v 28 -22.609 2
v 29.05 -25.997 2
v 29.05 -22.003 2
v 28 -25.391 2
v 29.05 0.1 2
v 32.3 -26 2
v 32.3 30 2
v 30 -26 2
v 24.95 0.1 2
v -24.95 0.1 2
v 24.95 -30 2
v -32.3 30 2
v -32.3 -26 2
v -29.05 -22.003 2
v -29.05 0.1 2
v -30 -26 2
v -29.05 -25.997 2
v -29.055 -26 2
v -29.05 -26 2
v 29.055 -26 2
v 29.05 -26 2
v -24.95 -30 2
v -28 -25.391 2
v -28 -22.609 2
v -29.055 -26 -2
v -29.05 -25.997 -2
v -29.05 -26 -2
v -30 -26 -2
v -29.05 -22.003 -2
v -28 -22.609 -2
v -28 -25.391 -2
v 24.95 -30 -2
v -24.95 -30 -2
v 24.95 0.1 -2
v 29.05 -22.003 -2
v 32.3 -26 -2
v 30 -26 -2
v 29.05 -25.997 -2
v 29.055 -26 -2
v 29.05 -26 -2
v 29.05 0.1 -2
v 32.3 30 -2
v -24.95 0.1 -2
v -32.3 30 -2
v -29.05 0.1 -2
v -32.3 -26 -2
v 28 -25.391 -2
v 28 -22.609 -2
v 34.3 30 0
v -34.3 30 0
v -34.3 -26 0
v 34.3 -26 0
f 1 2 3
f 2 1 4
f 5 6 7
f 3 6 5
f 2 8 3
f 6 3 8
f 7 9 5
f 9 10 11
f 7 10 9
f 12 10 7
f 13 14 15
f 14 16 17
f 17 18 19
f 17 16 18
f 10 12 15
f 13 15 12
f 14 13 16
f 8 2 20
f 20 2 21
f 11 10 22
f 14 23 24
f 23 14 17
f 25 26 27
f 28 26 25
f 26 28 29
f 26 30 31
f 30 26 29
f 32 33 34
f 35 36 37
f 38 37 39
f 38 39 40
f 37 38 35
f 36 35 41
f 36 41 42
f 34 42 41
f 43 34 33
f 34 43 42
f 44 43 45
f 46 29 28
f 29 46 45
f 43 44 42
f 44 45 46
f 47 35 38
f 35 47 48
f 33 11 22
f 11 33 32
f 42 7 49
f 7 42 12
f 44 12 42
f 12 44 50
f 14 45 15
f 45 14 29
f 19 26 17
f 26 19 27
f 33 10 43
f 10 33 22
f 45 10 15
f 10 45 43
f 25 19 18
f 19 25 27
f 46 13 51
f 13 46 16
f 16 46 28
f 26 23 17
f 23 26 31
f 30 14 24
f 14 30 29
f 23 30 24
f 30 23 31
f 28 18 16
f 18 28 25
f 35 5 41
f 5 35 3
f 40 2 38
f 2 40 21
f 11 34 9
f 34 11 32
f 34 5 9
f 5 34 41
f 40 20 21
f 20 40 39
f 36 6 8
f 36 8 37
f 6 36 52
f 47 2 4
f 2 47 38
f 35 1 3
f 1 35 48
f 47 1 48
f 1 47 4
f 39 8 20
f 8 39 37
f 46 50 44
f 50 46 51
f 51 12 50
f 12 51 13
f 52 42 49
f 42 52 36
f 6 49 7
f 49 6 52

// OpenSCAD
/* [Component] */
// Whether to create square of hex shelves
shape = "square"; // [square, hex]
// Whether to create a wall or joint
component = "wall"; // [wall, joint]

/* [Dimensions] */
// The width of a shelf unit base measured between the centers of two adjacent joints
width = 70; // [30:1:200]
// The depth of the shelf
depth = 60; // [30:1:200]
// Whether to engrave a benchy footprint into the wall
benchy_footprint = false;

/* [Wall Mount] */
// Whether to add a wall mount plate to the joint
wall_mount_plate = false;
// The thickness of the wall mount plate
mount_plate_thickness = 3; // [2:0.1:6]
// The angle of the countersink in the mount plate (typically 90 or 82°, 180° for no countersink)
countersink_angle = 90; // [80:1:180]
// The diameter of the screw hole (should be slightly larger than the outer thread diameter of the screw)
screw_hole_diameter = 4; // [2:0.1:6]
// The diameter of the screw head
screw_head_diameter = 8; // [4:0.1:12]

/* [Hidden] */
delta = 0.0001;
tolerance = 0.1;

if (component == "wall") {
  rotate(180) wall(width=width, depth=depth, benchy_footprint=benchy_footprint, hex=shape!="square");
} else if (component == "joint") {
  rotate(180) joint(depth=depth, hex=shape != "square");
}

module wall(width, depth, benchy_footprint=false, hex=false) {
  corner_gap = 0.7;
  hex_offset = hex ? 2*tan(30) : 0;
  intersection() {
    difference() {
      mirror_copy([1, 0, 0]) {
        translate([width/4 - delta, 0, 0]) {
          difference() {
            cube(size=[width/2 + delta, depth, 4], center=true);
            translate([width/4 - 8 + hex_offset, depth/2 - tolerance, 0])
              cube(size=[4 + tolerance, depth, 10], center=true);
            translate([width/4 - 4 + hex_offset, depth/2, 0])
              cube(size=[10, 8 + delta, 10], center=true);
          }
          translate([width/4 - 6 + hex_offset, depth/2 - 6, 0]) {
            difference() {
              cube(size=[2, 4, 4], center=true);
              mirror_copy([0, 1, 0])
                translate([-2, 3.7, 0])
                  rotate(30)
                    cube(size=[5, 5, 5], center=true);
            }
          }
        }
      }
      if (benchy_footprint) {
        translate([-2, 5, 0.4])
          rotate(135)
            scale([1.08, 1.15, 1])
              benchy_footprint();
      }
    }
    scale([1, 1, hex ? tan(60): 1])
      rotate([0, 45, 0])
        cube([(width - 2*corner_gap)/sqrt(2), 2*depth, (width - 2*corner_gap)/sqrt(2)], center=true);
  }
}

module joint(depth, hex=false) {
  cylinder_rotation = hex ? 0 : 22.5;
  outer_radius = hex ? (8 + 2*tan(30))/cos(180/6) : 10/cos(180/8);
  inner_radius = hex ? (4 + 2*tan(30))/cos(180/6) : 6/cos(180/8);
  notch_radius = hex ? (5 + 2*tan(30))/cos(180/6) : 7/cos(180/8);
  edges = hex ? 6 : 8;
  theta_steps = hex ? [0, 120, 240] : [0, 90, 180, 270];

  difference() {
    rotate([0, 0, cylinder_rotation])
      cylinder(h=depth, r=outer_radius, $fn=edges, center=true);
    rotate([0, 0, cylinder_rotation]) {
      translate([0, 0, 4 - tolerance])
        cylinder(h=depth, r=inner_radius, $fn=edges, center=true);
      translate([0, 0, -depth/2 + 6 - 1/2*sin(60) - 2*tolerance])
        cylinder(h=4 - 1/sin(60) + tolerance, r=notch_radius, $fn=edges, center=true);
      translate([0, 0, -depth/2 + 7.4])
        cylinder(h=1/sin(60), r1=notch_radius, r2=inner_radius, $fn=edges, center=true);
    }
    copies(theta=theta_steps) {
      difference() {
        union() {
          translate([0, 0, depth - tolerance])
            cube([4 + tolerance, 30, 2*depth], center=true);
          translate([0, 0, hex ? 7.3 : 6.5])
            rotate([45, 0, 0])
              cube(size=[4 + tolerance, 20, 20], center=true);
        }
        translate([0, 25, 0]) cube(size=[50, 50, 2*depth], center=true);
      }
    }
  }
  if (wall_mount_plate) {
    screw_chamfer_height = 0.5*(screw_head_diameter - screw_hole_diameter)/tan(0.5*countersink_angle);
    plate_offset = hex ? [0, 18.30] : [12.05, 12.05];
    translate([plate_offset[0], plate_offset[1], depth/2 - mount_plate_thickness/2]) {
      difference() {

        rotate([0, 0, cylinder_rotation])
          cylinder(h=mount_plate_thickness, r=outer_radius, $fn=edges, center=true);
      
        cylinder(h=2*mount_plate_thickness, r=screw_hole_diameter/2, $fn=50, center=true);
        translate([0, 0, 0.5*(screw_chamfer_height - mount_plate_thickness) - delta])
          cylinder(h=screw_chamfer_height, r1=screw_head_diameter/2, r2=screw_hole_diameter/2, $fn=50, center=true);
      }
    }
  }
}

module mirror_copy(v) {
  children();
  mirror(v) children();
}

module copies(x=[0], y=[0], z=[0], theta=[0]) {
  for (X = x)
    for (Y = y)
      for (Z = z)
        for (Theta = theta)
          rotate(Theta) translate([X, Y, Z]) children();
}

module benchy_footprint() {
  polyhedron(
    points=[[2.0716969966888428,7.982769966125488,1.9536688933285973e-10],[2.3567681312561035,-7.963685512542725,-0.000008919047104427591],[0.6087018847465515,8.032468795776367,-0.000003166403985233046],[10.237045288085938,-4.689568042755127,-0.00000226920155910193],[10.373709678649902,4.573715686798096,-0.000006830845904914895],[11.523579597473145,-3.4918837547302246,0.00000423389747084002],[6.8495192527771,-6.771529674530029,-0.000004874648766417522],[5.485960960388184,-7.294326305389404,-1.2912067248738168e-13],[6.775848865509033,6.805986404418945,0.0000025455547074670903],[4.176103591918945,7.656704425811768,8.601626355630998e-15],[4.184232711791992,-7.657739162445068,-0.0000062757508203503676],[3.0653116703033447,7.868319988250732,6.103624550224396e-14],[2.3567681312561035,-7.963685512542725,-0.000008919047104427591],[3.0653116703033447,7.868319988250732,6.103624550224396e-14],[4.184232711791992,-7.657739162445068,-0.0000062757508203503676],[5.3614726066589355,7.335305690765381,-2.749814598246303e-7],[4.184232711791992,-7.657739162445068,-0.0000062757508203503676],[4.176103591918945,7.656704425811768,8.601626355630998e-15],[13.09280776977539,-1.5420845746994019,-1.7381235339897216e-13],[13.69571304321289,0.5749781727790833,0.00015457486733794212],[13.712143898010254,-0.5417762398719788,0.0003244903346057981],[-23.62355613708496,-6.569286823272705,-5.327376015884511e-7],[-24.999282836914062,4.89489221572876,1.9616253066345735e-14],[0.6087018847465515,8.032468795776367,-0.000003166403985233046],[-23.62355613708496,-6.569286823272705,-5.327376015884511e-7],[-24.97644805908203,-5.181864261627197,0.000007532058589276858],[-24.999282836914062,4.89489221572876,1.9616253066345735e-14],[8.105497360229492,6.138993263244629,-0.0000027800342650152743],[8.025797843933105,-6.185941696166992,-0.000002621664407342905],[6.775848865509033,6.805986404418945,0.0000025455547074670903],[-24.064924240112305,6.421662330627441,-0.000007065121735649882],[-23.55986785888672,6.57940673828125,-1.6202317265623378e-15],[-24.949546813964844,5.277898788452148,-0.000004440998509380734],[-24.797481536865234,5.688729286193848,5.736383590360106e-14],[-24.56158447265625,6.039919376373291,-0.000005629016868624603],[-24.064924240112305,6.421662330627441,-0.000007065121735649882],[-23.55986785888672,6.57940673828125,-1.6202317265623378e-15],[-24.999282836914062,4.89489221572876,1.9616253066345735e-14],[-24.949546813964844,5.277898788452148,-0.000004440998509380734],[9.223620414733887,5.443843841552734,-4.163336342344337e-17],[10.373709678649902,4.573715686798096,-0.000006830845904914895],[10.237045288085938,-4.689568042755127,-0.00000226920155910193],[-24.797481536865234,5.688729286193848,5.736383590360106e-14],[-24.064924240112305,6.421662330627441,-0.000007065121735649882],[-24.949546813964844,5.277898788452148,-0.000004440998509380734],[8.025797843933105,-6.185941696166992,-0.000002621664407342905],[8.105497360229492,6.138993263244629,-0.0000027800342650152743],[9.038224220275879,-5.565593242645264,2.1974783104283802e-13],[3.0653116703033447,7.868319988250732,6.103624550224396e-14],[2.3567681312561035,-7.963685512542725,-0.000008919047104427591],[2.0716969966888428,7.982769966125488,1.9536688933285973e-10],[13.09280776977539,-1.5420845746994019,-1.7381235339897216e-13],[12.458027839660645,-2.41383695602417,-1.2568418528147163e-13],[12.66260814666748,2.1560821533203125,0.000011660446944006253],[0.6087018847465515,8.032468795776367,-0.000003166403985233046],[-24.999282836914062,4.89489221572876,1.9616253066345735e-14],[-23.55986785888672,6.57940673828125,-1.6202317265623378e-15],[-24.97644805908203,-5.181864261627197,0.000007532058589276858],[-23.62355613708496,-6.569286823272705,-5.327376015884511e-7],[-24.735225677490234,-5.807702541351318,0.0000013211475788921234],[6.775848865509033,6.805986404418945,0.0000025455547074670903],[5.485960960388184,-7.294326305389404,-1.2912067248738168e-13],[5.3614726066589355,7.335305690765381,-2.749814598246303e-7],[11.65356731414795,3.3572018146514893,0.0000031376607694255654],[12.66260814666748,2.1560821533203125,0.000011660446944006253],[12.458027839660645,-2.41383695602417,-1.2568418528147163e-13],[12.458027839660645,-2.41383695602417,-1.2568418528147163e-13],[11.523579597473145,-3.4918837547302246,0.00000423389747084002],[11.65356731414795,3.3572018146514893,0.0000031376607694255654],[12.66260814666748,2.1560821533203125,0.000011660446944006253],[13.69571304321289,0.5749781727790833,0.00015457486733794212],[13.09280776977539,-1.5420845746994019,-1.7381235339897216e-13],[13.809564590454102,0.19342970848083496,-7.158402581808332e-7],[13.712143898010254,-0.5417762398719788,0.0003244903346057981],[13.69571304321289,0.5749781727790833,0.00015457486733794212],[9.038224220275879,-5.565593242645264,2.1974783104283802e-13],[9.223620414733887,5.443843841552734,-4.163336342344337e-17],[10.237045288085938,-4.689568042755127,-0.00000226920155910193],[0.6087018847465515,8.032468795776367,-0.000003166403985233046],[0.5182068347930908,-8.028841018676758,-0.000001600229097675765],[-23.62355613708496,-6.569286823272705,-5.327376015884511e-7],[-24.735225677490234,-5.807702541351318,0.0000013211475788921234],[-23.62355613708496,-6.569286823272705,-5.327376015884511e-7],[-24.112863540649414,-6.392663478851318,0.00000218612535718421],[-24.735225677490234,-5.807702541351318,0.0000013211475788921234],[-24.112863540649414,-6.392663478851318,0.00000218612535718421],[-24.424203872680664,-6.169230937957764,1.0635242686518609e-13],[8.025797843933105,-6.185941696166992,-0.000002621664407342905],[6.8495192527771,-6.771529674530029,-0.000004874648766417522],[6.775848865509033,6.805986404418945,0.0000025455547074670903],[5.485960960388184,-7.294326305389404,-1.2912067248738168e-13],[4.184232711791992,-7.657739162445068,-0.0000062757508203503676],[5.3614726066589355,7.335305690765381,-2.749814598246303e-7],[10.373709678649902,4.573715686798096,-0.000006830845904914895],[11.65356731414795,3.3572018146514893,0.0000031376607694255654],[11.523579597473145,-3.4918837547302246,0.00000423389747084002],[8.105497360229492,6.138993263244629,-0.0000027800342650152743],[9.223620414733887,5.443843841552734,-4.163336342344337e-17],[9.038224220275879,-5.565593242645264,2.1974783104283802e-13],[13.809564590454102,0.19342970848083496,-7.158402581808332e-7],[13.813002586364746,-0.15599973499774933,1.7300570698264295e-12],[13.712143898010254,-0.5417762398719788,0.0003244903346057981],[2.3567681312561035,-7.963685512542725,-0.000008919047104427591],[0.5182068347930908,-8.028841018676758,-0.000001600229097675765],[0.6087018847465515,8.032468795776367,-0.000003166403985233046],[0.7481193542480469,-8.042202949523926,4.035956382751465],[2.3523011207580566,-7.963222503662109,4.035970687866211],[0.8170697689056396,8.033228874206543,4.035967826843262],[-24.823640823364258,-5.615785121917725,4.035968780517578],[-23.95098304748535,-6.4751458168029785,4.035971641540527],[-23.476160049438477,-6.594211101531982,4.035968780517578],[12.982776641845703,-1.7156678438186646,4.035968780517578],[13.324934005737305,1.1971338987350464,4.035968780517578],[12.57517147064209,2.2722842693328857,4.035968780517578],[2.3523011207580566,-7.963222503662109,4.035970687866211],[3.5033295154571533,-7.8009867668151855,4.035968780517578],[2.7648744583129883,7.9138503074646,4.0359721183776855],[4.1687703132629395,7.654848098754883,4.035968780517578],[2.7648744583129883,7.9138503074646,4.0359721183776855],[3.5033295154571533,-7.8009867668151855,4.035968780517578],[-24.424203872680664,-6.169230937957764,1.0635242686518609e-13],[-24.37799644470215,-6.208982467651367,4.035968780517578],[-24.65561866760254,-5.914384841918945,4.035968780517578],[-24.424203872680664,-6.169230937957764,1.0635242686518609e-13],[-24.65561866760254,-5.914384841918945,4.035968780517578],[-24.735225677490234,-5.807702541351318,0.0000013211475788921234],[-23.476160049438477,-6.594211101531982,4.035968780517578],[-23.51758575439453,6.581684589385986,4.035968780517578],[-24.978939056396484,-5.130396366119385,4.035968780517578],[13.730743408203125,0.49671924114227295,4.035968780517578],[13.324934005737305,1.1971338987350464,4.035968780517578],[13.612114906311035,-0.7408075928688049,4.036297798156738],[-23.92650604248047,6.470495223999023,4.035968780517578],[-24.880678176879883,5.4758710861206055,4.035968780517578],[-23.51758575439453,6.581684589385986,4.035968780517578],[-24.654815673828125,5.9082536697387695,4.035974979400635],[-24.880678176879883,5.4758710861206055,4.035968780517578],[-23.92650604248047,6.470495223999023,4.035968780517578],[-24.306608200073242,6.260214328765869,4.035968780517578],[-24.654815673828125,5.9082536697387695,4.035974979400635],[-23.92650604248047,6.470495223999023,4.035968780517578],[7.787315368652344,6.310880184173584,4.035968780517578],[8.428641319274902,-5.9642229080200195,4.0359721183776855],[8.829878807067871,5.7051591873168945,4.035974025726318],[8.428641319274902,-5.9642229080200195,4.0359721183776855],[10.037646293640137,-4.861592769622803,4.035970687866211],[8.829878807067871,5.7051591873168945,4.035974025726318],[7.787315368652344,6.310880184173584,4.035968780517578],[6.569126129150391,6.8918843269348145,4.035971164703369],[7.254128932952881,-6.588652610778809,4.035968780517578],[7.254128932952881,-6.588652610778809,4.035968780517578],[6.569126129150391,6.8918843269348145,4.035971164703369],[5.8483805656433105,-7.180619716644287,4.03596830368042],[5.8483805656433105,-7.180619716644287,4.03596830368042],[5.172666072845459,7.391687870025635,4.035970211029053],[4.5553436279296875,-7.570977687835693,4.035968780517578],[11.314323425292969,-3.711768865585327,4.035968780517578],[12.237446784973145,-2.7044854164123535,4.035976409912109],[11.419999122619629,3.6077122688293457,4.03596305847168],[-23.51758575439453,6.581684589385986,4.035968780517578],[-24.979732513427734,5.070980548858643,4.035970211029053],[-24.978939056396484,-5.130396366119385,4.035968780517578],[-24.65561866760254,-5.914384841918945,4.035968780517578],[-23.95098304748535,-6.4751458168029785,4.035971641540527],[-24.823640823364258,-5.615785121917725,4.035968780517578],[-24.978939056396484,-5.130396366119385,4.035968780517578],[-24.823640823364258,-5.615785121917725,4.035968780517578],[-23.476160049438477,-6.594211101531982,4.035968780517578],[8.829878807067871,5.7051591873168945,4.035974025726318],[10.037646293640137,-4.861592769622803,4.035970687866211],[10.093369483947754,4.805141448974609,4.035971164703369],[5.172666072845459,7.391687870025635,4.035970211029053],[4.1687703132629395,7.654848098754883,4.035968780517578],[4.5553436279296875,-7.570977687835693,4.035968780517578],[10.037646293640137,-4.861592769622803,4.035970687866211],[11.419999122619629,3.6077122688293457,4.03596305847168],[10.093369483947754,4.805141448974609,4.035971164703369],[12.982776641845703,-1.7156678438186646,4.035968780517578],[12.57517147064209,2.2722842693328857,4.035968780517578],[12.237446784973145,-2.7044854164123535,4.035976409912109],[13.730743408203125,0.49671924114227295,4.035968780517578],[13.612114906311035,-0.7408075928688049,4.036297798156738],[13.798629760742188,-0.30989545583724976,4.035935878753662],[13.612114906311035,-0.7408075928688049,4.036297798156738],[13.324934005737305,1.1971338987350464,4.035968780517578],[12.982776641845703,-1.7156678438186646,4.035968780517578],[10.037646293640137,-4.861592769622803,4.035970687866211],[11.314323425292969,-3.711768865585327,4.035968780517578],[11.419999122619629,3.6077122688293457,4.03596305847168],[13.818782806396484,0.19217996299266815,4.035967826843262],[13.730743408203125,0.49671924114227295,4.035968780517578],[13.798629760742188,-0.30989545583724976,4.035935878753662],[12.57517147064209,2.2722842693328857,4.035968780517578],[11.419999122619629,3.6077122688293457,4.03596305847168],[12.237446784973145,-2.7044854164123535,4.035976409912109],[0.8170697689056396,8.033228874206543,4.035967826843262],[-23.51758575439453,6.581684589385986,4.035968780517578],[-23.476160049438477,-6.594211101531982,4.035968780517578],[-24.37799644470215,-6.208982467651367,4.035968780517578],[-23.95098304748535,-6.4751458168029785,4.035971641540527],[-24.65561866760254,-5.914384841918945,4.035968780517578],[2.7648744583129883,7.9138503074646,4.0359721183776855],[0.8170697689056396,8.033228874206543,4.035967826843262],[2.3523011207580566,-7.963222503662109,4.035970687866211],[6.569126129150391,6.8918843269348145,4.035971164703369],[5.172666072845459,7.391687870025635,4.035970211029053],[5.8483805656433105,-7.180619716644287,4.03596830368042],[8.428641319274902,-5.9642229080200195,4.0359721183776855],[7.787315368652344,6.310880184173584,4.035968780517578],[7.254128932952881,-6.588652610778809,4.035968780517578],[0.8170697689056396,8.033228874206543,4.035967826843262],[-23.476160049438477,-6.594211101531982,4.035968780517578],[0.7481193542480469,-8.042202949523926,4.035956382751465],[4.5553436279296875,-7.570977687835693,4.035968780517578],[4.1687703132629395,7.654848098754883,4.035968780517578],[3.5033295154571533,-7.8009867668151855,4.035968780517578],[-24.880678176879883,5.4758710861206055,4.035968780517578],[-24.979732513427734,5.070980548858643,4.035970211029053],[-23.51758575439453,6.581684589385986,4.035968780517578],[10.237045288085938,-4.689568042755127,-0.00000226920155910193],[10.037646293640137,-4.861592769622803,4.035970687866211],[9.038224220275879,-5.565593242645264,2.1974783104283802e-13],[13.69571304321289,0.5749781727790833,0.00015457486733794212],[13.730743408203125,0.49671924114227295,4.035968780517578],[13.818782806396484,0.19217996299266815,4.035967826843262],[11.523579597473145,-3.4918837547302246,0.00000423389747084002],[11.314323425292969,-3.711768865585327,4.035968780517578],[10.237045288085938,-4.689568042755127,-0.00000226920155910193],[11.65356731414795,3.3572018146514893,0.0000031376607694255654],[11.419999122619629,3.6077122688293457,4.03596305847168],[12.57517147064209,2.2722842693328857,4.035968780517578],[-24.97644805908203,-5.181864261627197,0.000007532058589276858],[-24.978939056396484,-5.130396366119385,4.035968780517578],[-24.999282836914062,4.89489221572876,1.9616253066345735e-14],[12.66260814666748,2.1560821533203125,0.000011660446944006253],[12.57517147064209,2.2722842693328857,4.035968780517578],[13.324934005737305,1.1971338987350464,4.035968780517578],[13.09280776977539,-1.5420845746994019,-1.7381235339897216e-13],[12.982776641845703,-1.7156678438186646,4.035968780517578],[12.458027839660645,-2.41383695602417,-1.2568418528147163e-13],[0.6087018847465515,8.032468795776367,-0.000003166403985233046],[-23.51758575439453,6.581684589385986,4.035968780517578],[0.8170697689056396,8.033228874206543,4.035967826843262],[13.712143898010254,-0.5417762398719788,0.0003244903346057981],[13.612114906311035,-0.7408075928688049,4.036297798156738],[13.09280776977539,-1.5420845746994019,-1.7381235339897216e-13],[0.5182068347930908,-8.028841018676758,-0.000001600229097675765],[-23.476160049438477,-6.594211101531982,4.035968780517578],[-23.62355613708496,-6.569286823272705,-5.327376015884511e-7],[2.0716969966888428,7.982769966125488,1.9536688933285973e-10],[0.8170697689056396,8.033228874206543,4.035967826843262],[2.7648744583129883,7.9138503074646,4.0359721183776855],[-24.949546813964844,5.277898788452148,-0.000004440998509380734],[-24.880678176879883,5.4758710861206055,4.035968780517578],[-24.797481536865234,5.688729286193848,5.736383590360106e-14],[2.3567681312561035,-7.963685512542725,-0.000008919047104427591],[0.7481193542480469,-8.042202949523926,4.035956382751465],[0.5182068347930908,-8.028841018676758,-0.000001600229097675765],[4.176103591918945,7.656704425811768,8.601626355630998e-15],[4.1687703132629395,7.654848098754883,4.035968780517578],[5.172666072845459,7.391687870025635,4.035970211029053],[-24.56158447265625,6.039919376373291,-0.000005629016868624603],[-24.654815673828125,5.9082536697387695,4.035974979400635],[-24.306608200073242,6.260214328765869,4.035968780517578],[4.184232711791992,-7.657739162445068,-0.0000062757508203503676],[3.5033295154571533,-7.8009867668151855,4.035968780517578],[2.3567681312561035,-7.963685512542725,-0.000008919047104427591],[-24.064924240112305,6.421662330627441,-0.000007065121735649882],[-24.306608200073242,6.260214328765869,4.035968780517578],[-23.92650604248047,6.470495223999023,4.035968780517578],[5.3614726066589355,7.335305690765381,-2.749814598246303e-7],[5.172666072845459,7.391687870025635,4.035970211029053],[6.569126129150391,6.8918843269348145,4.035971164703369],[5.485960960388184,-7.294326305389404,-1.2912067248738168e-13],[4.5553436279296875,-7.570977687835693,4.035968780517578],[4.184232711791992,-7.657739162445068,-0.0000062757508203503676],[6.775848865509033,6.805986404418945,0.0000025455547074670903],[6.569126129150391,6.8918843269348145,4.035971164703369],[7.787315368652344,6.310880184173584,4.035968780517578],[6.8495192527771,-6.771529674530029,-0.000004874648766417522],[5.8483805656433105,-7.180619716644287,4.03596830368042],[5.485960960388184,-7.294326305389404,-1.2912067248738168e-13],[8.105497360229492,6.138993263244629,-0.0000027800342650152743],[7.787315368652344,6.310880184173584,4.035968780517578],[8.829878807067871,5.7051591873168945,4.035974025726318],[8.025797843933105,-6.185941696166992,-0.000002621664407342905],[7.254128932952881,-6.588652610778809,4.035968780517578],[6.8495192527771,-6.771529674530029,-0.000004874648766417522],[-23.62355613708496,-6.569286823272705,-5.327376015884511e-7],[-23.95098304748535,-6.4751458168029785,4.035971641540527],[-24.112863540649414,-6.392663478851318,0.00000218612535718421],[9.223620414733887,5.443843841552734,-4.163336342344337e-17],[8.829878807067871,5.7051591873168945,4.035974025726318],[10.093369483947754,4.805141448974609,4.035971164703369],[9.038224220275879,-5.565593242645264,2.1974783104283802e-13],[8.428641319274902,-5.9642229080200195,4.0359721183776855],[8.025797843933105,-6.185941696166992,-0.000002621664407342905],[-24.112863540649414,-6.392663478851318,0.00000218612535718421],[-24.37799644470215,-6.208982467651367,4.035968780517578],[-24.424203872680664,-6.169230937957764,1.0635242686518609e-13],[13.798629760742188,-0.30989545583724976,4.035935878753662],[13.712143898010254,-0.5417762398719788,0.0003244903346057981],[13.813002586364746,-0.15599973499774933,1.7300570698264295e-12],[-24.823640823364258,-5.615785121917725,4.035968780517578],[-24.735225677490234,-5.807702541351318,0.0000013211475788921234],[-24.65561866760254,-5.914384841918945,4.035968780517578],[13.809564590454102,0.19342970848083496,-7.158402581808332e-7],[13.69571304321289,0.5749781727790833,0.00015457486733794212],[13.818782806396484,0.19217996299266815,4.035967826843262],[11.65356731414795,3.3572018146514893,0.0000031376607694255654],[10.373709678649902,4.573715686798096,-0.000006830845904914895],[11.419999122619629,3.6077122688293457,4.03596305847168],[10.237045288085938,-4.689568042755127,-0.00000226920155910193],[11.314323425292969,-3.711768865585327,4.035968780517578],[10.037646293640137,-4.861592769622803,4.035970687866211],[11.523579597473145,-3.4918837547302246,0.00000423389747084002],[12.237446784973145,-2.7044854164123535,4.035976409912109],[11.314323425292969,-3.711768865585327,4.035968780517578],[12.66260814666748,2.1560821533203125,0.000011660446944006253],[11.65356731414795,3.3572018146514893,0.0000031376607694255654],[12.57517147064209,2.2722842693328857,4.035968780517578],[12.458027839660645,-2.41383695602417,-1.2568418528147163e-13],[12.982776641845703,-1.7156678438186646,4.035968780517578],[12.237446784973145,-2.7044854164123535,4.035976409912109],[-24.999282836914062,4.89489221572876,1.9616253066345735e-14],[-24.978939056396484,-5.130396366119385,4.035968780517578],[-24.979732513427734,5.070980548858643,4.035970211029053],[13.09280776977539,-1.5420845746994019,-1.7381235339897216e-13],[13.612114906311035,-0.7408075928688049,4.036297798156738],[12.982776641845703,-1.7156678438186646,4.035968780517578],[13.730743408203125,0.49671924114227295,4.035968780517578],[13.69571304321289,0.5749781727790833,0.00015457486733794212],[13.324934005737305,1.1971338987350464,4.035968780517578],[13.69571304321289,0.5749781727790833,0.00015457486733794212],[12.66260814666748,2.1560821533203125,0.000011660446944006253],[13.324934005737305,1.1971338987350464,4.035968780517578],[0.6087018847465515,8.032468795776367,-0.000003166403985233046],[-23.55986785888672,6.57940673828125,-1.6202317265623378e-15],[-23.51758575439453,6.581684589385986,4.035968780517578],[2.0716969966888428,7.982769966125488,1.9536688933285973e-10],[0.6087018847465515,8.032468795776367,-0.000003166403985233046],[0.8170697689056396,8.033228874206543,4.035967826843262],[0.5182068347930908,-8.028841018676758,-0.000001600229097675765],[0.7481193542480469,-8.042202949523926,4.035956382751465],[-23.476160049438477,-6.594211101531982,4.035968780517578],[2.7648744583129883,7.9138503074646,4.0359721183776855],[3.0653116703033447,7.868319988250732,6.103624550224396e-14],[2.0716969966888428,7.982769966125488,1.9536688933285973e-10],[-24.949546813964844,5.277898788452148,-0.000004440998509380734],[-24.979732513427734,5.070980548858643,4.035970211029053],[-24.880678176879883,5.4758710861206055,4.035968780517578],[2.3567681312561035,-7.963685512542725,-0.000008919047104427591],[2.3523011207580566,-7.963222503662109,4.035970687866211],[0.7481193542480469,-8.042202949523926,4.035956382751465],[-24.56158447265625,6.039919376373291,-0.000005629016868624603],[-24.797481536865234,5.688729286193848,5.736383590360106e-14],[-24.654815673828125,5.9082536697387695,4.035974979400635],[-24.797481536865234,5.688729286193848,5.736383590360106e-14],[-24.880678176879883,5.4758710861206055,4.035968780517578],[-24.654815673828125,5.9082536697387695,4.035974979400635],[5.3614726066589355,7.335305690765381,-2.749814598246303e-7],[4.176103591918945,7.656704425811768,8.601626355630998e-15],[5.172666072845459,7.391687870025635,4.035970211029053],[2.3567681312561035,-7.963685512542725,-0.000008919047104427591],[3.5033295154571533,-7.8009867668151855,4.035968780517578],[2.3523011207580566,-7.963222503662109,4.035970687866211],[-24.064924240112305,6.421662330627441,-0.000007065121735649882],[-24.56158447265625,6.039919376373291,-0.000005629016868624603],[-24.306608200073242,6.260214328765869,4.035968780517578],[4.184232711791992,-7.657739162445068,-0.0000062757508203503676],[4.5553436279296875,-7.570977687835693,4.035968780517578],[3.5033295154571533,-7.8009867668151855,4.035968780517578],[6.775848865509033,6.805986404418945,0.0000025455547074670903],[5.3614726066589355,7.335305690765381,-2.749814598246303e-7],[6.569126129150391,6.8918843269348145,4.035971164703369],[5.485960960388184,-7.294326305389404,-1.2912067248738168e-13],[5.8483805656433105,-7.180619716644287,4.03596830368042],[4.5553436279296875,-7.570977687835693,4.035968780517578],[8.105497360229492,6.138993263244629,-0.0000027800342650152743],[6.775848865509033,6.805986404418945,0.0000025455547074670903],[7.787315368652344,6.310880184173584,4.035968780517578],[6.8495192527771,-6.771529674530029,-0.000004874648766417522],[7.254128932952881,-6.588652610778809,4.035968780517578],[5.8483805656433105,-7.180619716644287,4.03596830368042],[-23.62355613708496,-6.569286823272705,-5.327376015884511e-7],[-23.476160049438477,-6.594211101531982,4.035968780517578],[-23.95098304748535,-6.4751458168029785,4.035971641540527],[9.223620414733887,5.443843841552734,-4.163336342344337e-17],[8.105497360229492,6.138993263244629,-0.0000027800342650152743],[8.829878807067871,5.7051591873168945,4.035974025726318],[8.025797843933105,-6.185941696166992,-0.000002621664407342905],[8.428641319274902,-5.9642229080200195,4.0359721183776855],[7.254128932952881,-6.588652610778809,4.035968780517578],[-24.112863540649414,-6.392663478851318,0.00000218612535718421],[-23.95098304748535,-6.4751458168029785,4.035971641540527],[-24.37799644470215,-6.208982467651367,4.035968780517578],[10.373709678649902,4.573715686798096,-0.000006830845904914895],[9.223620414733887,5.443843841552734,-4.163336342344337e-17],[10.093369483947754,4.805141448974609,4.035971164703369],[9.038224220275879,-5.565593242645264,2.1974783104283802e-13],[10.037646293640137,-4.861592769622803,4.035970687866211],[8.428641319274902,-5.9642229080200195,4.0359721183776855],[-24.823640823364258,-5.615785121917725,4.035968780517578],[-24.978939056396484,-5.130396366119385,4.035968780517578],[-24.97644805908203,-5.181864261627197,0.000007532058589276858],[-24.823640823364258,-5.615785121917725,4.035968780517578],[-24.97644805908203,-5.181864261627197,0.000007532058589276858],[-24.735225677490234,-5.807702541351318,0.0000013211475788921234],[10.093369483947754,4.805141448974609,4.035971164703369],[11.419999122619629,3.6077122688293457,4.03596305847168],[10.373709678649902,4.573715686798096,-0.000006830845904914895],[13.813002586364746,-0.15599973499774933,1.7300570698264295e-12],[13.809564590454102,0.19342970848083496,-7.158402581808332e-7],[13.818782806396484,0.19217996299266815,4.035967826843262],[13.813002586364746,-0.15599973499774933,1.7300570698264295e-12],[13.818782806396484,0.19217996299266815,4.035967826843262],[13.798629760742188,-0.30989545583724976,4.035935878753662],[4.176103591918945,7.656704425811768,8.601626355630998e-15],[3.0653116703033447,7.868319988250732,6.103624550224396e-14],[2.7648744583129883,7.9138503074646,4.0359721183776855],[4.176103591918945,7.656704425811768,8.601626355630998e-15],[2.7648744583129883,7.9138503074646,4.0359721183776855],[4.1687703132629395,7.654848098754883,4.035968780517578],[13.798629760742188,-0.30989545583724976,4.035935878753662],[13.612114906311035,-0.7408075928688049,4.036297798156738],[13.712143898010254,-0.5417762398719788,0.0003244903346057981],[12.237446784973145,-2.7044854164123535,4.035976409912109],[11.523579597473145,-3.4918837547302246,0.00000423389747084002],[12.458027839660645,-2.41383695602417,-1.2568418528147163e-13],[-24.979732513427734,5.070980548858643,4.035970211029053],[-24.949546813964844,5.277898788452148,-0.000004440998509380734],[-24.999282836914062,4.89489221572876,1.9616253066345735e-14],[-23.55986785888672,6.57940673828125,-1.6202317265623378e-15],[-24.064924240112305,6.421662330627441,-0.000007065121735649882],[-23.92650604248047,6.470495223999023,4.035968780517578],[-23.55986785888672,6.57940673828125,-1.6202317265623378e-15],[-23.92650604248047,6.470495223999023,4.035968780517578],[-23.51758575439453,6.581684589385986,4.035968780517578] ],
    faces=[[0,1,2],[3,4,5],[6,7,8],[9,10,11],[12,13,14],[15,16,17],[18,19,20],[21,22,23],[24,25,26],[27,28,29],[30,31,32],[33,34,35],[36,37,38],[39,40,41],[42,43,44],[45,46,47],[48,49,50],[51,52,53],[54,55,56],[57,58,59],[60,61,62],[63,64,65],[66,67,68],[69,70,71],[72,73,74],[75,76,77],[78,79,80],[81,82,83],[84,85,86],[87,88,89],[90,91,92],[93,94,95],[96,97,98],[99,100,101],[102,103,104],[105,106,107],[108,109,110],[111,112,113],[114,115,116],[117,118,119],[120,121,122],[123,124,125],[126,127,128],[129,130,131],[132,133,134],[135,136,137],[138,139,140],[141,142,143],[144,145,146],[147,148,149],[150,151,152],[153,154,155],[156,157,158],[159,160,161],[162,163,164],[165,166,167],[168,169,170],[171,172,173],[174,175,176],[177,178,179],[180,181,182],[183,184,185],[186,187,188],[189,190,191],[192,193,194],[195,196,197],[198,199,200],[201,202,203],[204,205,206],[207,208,209],[210,211,212],[213,214,215],[216,217,218],[219,220,221],[222,223,224],[225,226,227],[228,229,230],[231,232,233],[234,235,236],[237,238,239],[240,241,242],[243,244,245],[246,247,248],[249,250,251],[252,253,254],[255,256,257],[258,259,260],[261,262,263],[264,265,266],[267,268,269],[270,271,272],[273,274,275],[276,277,278],[279,280,281],[282,283,284],[285,286,287],[288,289,290],[291,292,293],[294,295,296],[297,298,299],[300,301,302],[303,304,305],[306,307,308],[309,310,311],[312,313,314],[315,316,317],[318,319,320],[321,322,323],[324,325,326],[327,328,329],[330,331,332],[333,334,335],[336,337,338],[339,340,341],[342,343,344],[345,346,347],[348,349,350],[351,352,353],[354,355,356],[357,358,359],[360,361,362],[363,364,365],[366,367,368],[369,370,371],[372,373,374],[375,376,377],[378,379,380],[381,382,383],[384,385,386],[387,388,389],[390,391,392],[393,394,395],[396,397,398],[399,400,401],[402,403,404],[405,406,407],[408,409,410],[411,412,413],[414,415,416],[417,418,419],[420,421,422],[423,424,425],[426,427,428],[429,430,431],[432,433,434],[435,436,437]]
  );
}
